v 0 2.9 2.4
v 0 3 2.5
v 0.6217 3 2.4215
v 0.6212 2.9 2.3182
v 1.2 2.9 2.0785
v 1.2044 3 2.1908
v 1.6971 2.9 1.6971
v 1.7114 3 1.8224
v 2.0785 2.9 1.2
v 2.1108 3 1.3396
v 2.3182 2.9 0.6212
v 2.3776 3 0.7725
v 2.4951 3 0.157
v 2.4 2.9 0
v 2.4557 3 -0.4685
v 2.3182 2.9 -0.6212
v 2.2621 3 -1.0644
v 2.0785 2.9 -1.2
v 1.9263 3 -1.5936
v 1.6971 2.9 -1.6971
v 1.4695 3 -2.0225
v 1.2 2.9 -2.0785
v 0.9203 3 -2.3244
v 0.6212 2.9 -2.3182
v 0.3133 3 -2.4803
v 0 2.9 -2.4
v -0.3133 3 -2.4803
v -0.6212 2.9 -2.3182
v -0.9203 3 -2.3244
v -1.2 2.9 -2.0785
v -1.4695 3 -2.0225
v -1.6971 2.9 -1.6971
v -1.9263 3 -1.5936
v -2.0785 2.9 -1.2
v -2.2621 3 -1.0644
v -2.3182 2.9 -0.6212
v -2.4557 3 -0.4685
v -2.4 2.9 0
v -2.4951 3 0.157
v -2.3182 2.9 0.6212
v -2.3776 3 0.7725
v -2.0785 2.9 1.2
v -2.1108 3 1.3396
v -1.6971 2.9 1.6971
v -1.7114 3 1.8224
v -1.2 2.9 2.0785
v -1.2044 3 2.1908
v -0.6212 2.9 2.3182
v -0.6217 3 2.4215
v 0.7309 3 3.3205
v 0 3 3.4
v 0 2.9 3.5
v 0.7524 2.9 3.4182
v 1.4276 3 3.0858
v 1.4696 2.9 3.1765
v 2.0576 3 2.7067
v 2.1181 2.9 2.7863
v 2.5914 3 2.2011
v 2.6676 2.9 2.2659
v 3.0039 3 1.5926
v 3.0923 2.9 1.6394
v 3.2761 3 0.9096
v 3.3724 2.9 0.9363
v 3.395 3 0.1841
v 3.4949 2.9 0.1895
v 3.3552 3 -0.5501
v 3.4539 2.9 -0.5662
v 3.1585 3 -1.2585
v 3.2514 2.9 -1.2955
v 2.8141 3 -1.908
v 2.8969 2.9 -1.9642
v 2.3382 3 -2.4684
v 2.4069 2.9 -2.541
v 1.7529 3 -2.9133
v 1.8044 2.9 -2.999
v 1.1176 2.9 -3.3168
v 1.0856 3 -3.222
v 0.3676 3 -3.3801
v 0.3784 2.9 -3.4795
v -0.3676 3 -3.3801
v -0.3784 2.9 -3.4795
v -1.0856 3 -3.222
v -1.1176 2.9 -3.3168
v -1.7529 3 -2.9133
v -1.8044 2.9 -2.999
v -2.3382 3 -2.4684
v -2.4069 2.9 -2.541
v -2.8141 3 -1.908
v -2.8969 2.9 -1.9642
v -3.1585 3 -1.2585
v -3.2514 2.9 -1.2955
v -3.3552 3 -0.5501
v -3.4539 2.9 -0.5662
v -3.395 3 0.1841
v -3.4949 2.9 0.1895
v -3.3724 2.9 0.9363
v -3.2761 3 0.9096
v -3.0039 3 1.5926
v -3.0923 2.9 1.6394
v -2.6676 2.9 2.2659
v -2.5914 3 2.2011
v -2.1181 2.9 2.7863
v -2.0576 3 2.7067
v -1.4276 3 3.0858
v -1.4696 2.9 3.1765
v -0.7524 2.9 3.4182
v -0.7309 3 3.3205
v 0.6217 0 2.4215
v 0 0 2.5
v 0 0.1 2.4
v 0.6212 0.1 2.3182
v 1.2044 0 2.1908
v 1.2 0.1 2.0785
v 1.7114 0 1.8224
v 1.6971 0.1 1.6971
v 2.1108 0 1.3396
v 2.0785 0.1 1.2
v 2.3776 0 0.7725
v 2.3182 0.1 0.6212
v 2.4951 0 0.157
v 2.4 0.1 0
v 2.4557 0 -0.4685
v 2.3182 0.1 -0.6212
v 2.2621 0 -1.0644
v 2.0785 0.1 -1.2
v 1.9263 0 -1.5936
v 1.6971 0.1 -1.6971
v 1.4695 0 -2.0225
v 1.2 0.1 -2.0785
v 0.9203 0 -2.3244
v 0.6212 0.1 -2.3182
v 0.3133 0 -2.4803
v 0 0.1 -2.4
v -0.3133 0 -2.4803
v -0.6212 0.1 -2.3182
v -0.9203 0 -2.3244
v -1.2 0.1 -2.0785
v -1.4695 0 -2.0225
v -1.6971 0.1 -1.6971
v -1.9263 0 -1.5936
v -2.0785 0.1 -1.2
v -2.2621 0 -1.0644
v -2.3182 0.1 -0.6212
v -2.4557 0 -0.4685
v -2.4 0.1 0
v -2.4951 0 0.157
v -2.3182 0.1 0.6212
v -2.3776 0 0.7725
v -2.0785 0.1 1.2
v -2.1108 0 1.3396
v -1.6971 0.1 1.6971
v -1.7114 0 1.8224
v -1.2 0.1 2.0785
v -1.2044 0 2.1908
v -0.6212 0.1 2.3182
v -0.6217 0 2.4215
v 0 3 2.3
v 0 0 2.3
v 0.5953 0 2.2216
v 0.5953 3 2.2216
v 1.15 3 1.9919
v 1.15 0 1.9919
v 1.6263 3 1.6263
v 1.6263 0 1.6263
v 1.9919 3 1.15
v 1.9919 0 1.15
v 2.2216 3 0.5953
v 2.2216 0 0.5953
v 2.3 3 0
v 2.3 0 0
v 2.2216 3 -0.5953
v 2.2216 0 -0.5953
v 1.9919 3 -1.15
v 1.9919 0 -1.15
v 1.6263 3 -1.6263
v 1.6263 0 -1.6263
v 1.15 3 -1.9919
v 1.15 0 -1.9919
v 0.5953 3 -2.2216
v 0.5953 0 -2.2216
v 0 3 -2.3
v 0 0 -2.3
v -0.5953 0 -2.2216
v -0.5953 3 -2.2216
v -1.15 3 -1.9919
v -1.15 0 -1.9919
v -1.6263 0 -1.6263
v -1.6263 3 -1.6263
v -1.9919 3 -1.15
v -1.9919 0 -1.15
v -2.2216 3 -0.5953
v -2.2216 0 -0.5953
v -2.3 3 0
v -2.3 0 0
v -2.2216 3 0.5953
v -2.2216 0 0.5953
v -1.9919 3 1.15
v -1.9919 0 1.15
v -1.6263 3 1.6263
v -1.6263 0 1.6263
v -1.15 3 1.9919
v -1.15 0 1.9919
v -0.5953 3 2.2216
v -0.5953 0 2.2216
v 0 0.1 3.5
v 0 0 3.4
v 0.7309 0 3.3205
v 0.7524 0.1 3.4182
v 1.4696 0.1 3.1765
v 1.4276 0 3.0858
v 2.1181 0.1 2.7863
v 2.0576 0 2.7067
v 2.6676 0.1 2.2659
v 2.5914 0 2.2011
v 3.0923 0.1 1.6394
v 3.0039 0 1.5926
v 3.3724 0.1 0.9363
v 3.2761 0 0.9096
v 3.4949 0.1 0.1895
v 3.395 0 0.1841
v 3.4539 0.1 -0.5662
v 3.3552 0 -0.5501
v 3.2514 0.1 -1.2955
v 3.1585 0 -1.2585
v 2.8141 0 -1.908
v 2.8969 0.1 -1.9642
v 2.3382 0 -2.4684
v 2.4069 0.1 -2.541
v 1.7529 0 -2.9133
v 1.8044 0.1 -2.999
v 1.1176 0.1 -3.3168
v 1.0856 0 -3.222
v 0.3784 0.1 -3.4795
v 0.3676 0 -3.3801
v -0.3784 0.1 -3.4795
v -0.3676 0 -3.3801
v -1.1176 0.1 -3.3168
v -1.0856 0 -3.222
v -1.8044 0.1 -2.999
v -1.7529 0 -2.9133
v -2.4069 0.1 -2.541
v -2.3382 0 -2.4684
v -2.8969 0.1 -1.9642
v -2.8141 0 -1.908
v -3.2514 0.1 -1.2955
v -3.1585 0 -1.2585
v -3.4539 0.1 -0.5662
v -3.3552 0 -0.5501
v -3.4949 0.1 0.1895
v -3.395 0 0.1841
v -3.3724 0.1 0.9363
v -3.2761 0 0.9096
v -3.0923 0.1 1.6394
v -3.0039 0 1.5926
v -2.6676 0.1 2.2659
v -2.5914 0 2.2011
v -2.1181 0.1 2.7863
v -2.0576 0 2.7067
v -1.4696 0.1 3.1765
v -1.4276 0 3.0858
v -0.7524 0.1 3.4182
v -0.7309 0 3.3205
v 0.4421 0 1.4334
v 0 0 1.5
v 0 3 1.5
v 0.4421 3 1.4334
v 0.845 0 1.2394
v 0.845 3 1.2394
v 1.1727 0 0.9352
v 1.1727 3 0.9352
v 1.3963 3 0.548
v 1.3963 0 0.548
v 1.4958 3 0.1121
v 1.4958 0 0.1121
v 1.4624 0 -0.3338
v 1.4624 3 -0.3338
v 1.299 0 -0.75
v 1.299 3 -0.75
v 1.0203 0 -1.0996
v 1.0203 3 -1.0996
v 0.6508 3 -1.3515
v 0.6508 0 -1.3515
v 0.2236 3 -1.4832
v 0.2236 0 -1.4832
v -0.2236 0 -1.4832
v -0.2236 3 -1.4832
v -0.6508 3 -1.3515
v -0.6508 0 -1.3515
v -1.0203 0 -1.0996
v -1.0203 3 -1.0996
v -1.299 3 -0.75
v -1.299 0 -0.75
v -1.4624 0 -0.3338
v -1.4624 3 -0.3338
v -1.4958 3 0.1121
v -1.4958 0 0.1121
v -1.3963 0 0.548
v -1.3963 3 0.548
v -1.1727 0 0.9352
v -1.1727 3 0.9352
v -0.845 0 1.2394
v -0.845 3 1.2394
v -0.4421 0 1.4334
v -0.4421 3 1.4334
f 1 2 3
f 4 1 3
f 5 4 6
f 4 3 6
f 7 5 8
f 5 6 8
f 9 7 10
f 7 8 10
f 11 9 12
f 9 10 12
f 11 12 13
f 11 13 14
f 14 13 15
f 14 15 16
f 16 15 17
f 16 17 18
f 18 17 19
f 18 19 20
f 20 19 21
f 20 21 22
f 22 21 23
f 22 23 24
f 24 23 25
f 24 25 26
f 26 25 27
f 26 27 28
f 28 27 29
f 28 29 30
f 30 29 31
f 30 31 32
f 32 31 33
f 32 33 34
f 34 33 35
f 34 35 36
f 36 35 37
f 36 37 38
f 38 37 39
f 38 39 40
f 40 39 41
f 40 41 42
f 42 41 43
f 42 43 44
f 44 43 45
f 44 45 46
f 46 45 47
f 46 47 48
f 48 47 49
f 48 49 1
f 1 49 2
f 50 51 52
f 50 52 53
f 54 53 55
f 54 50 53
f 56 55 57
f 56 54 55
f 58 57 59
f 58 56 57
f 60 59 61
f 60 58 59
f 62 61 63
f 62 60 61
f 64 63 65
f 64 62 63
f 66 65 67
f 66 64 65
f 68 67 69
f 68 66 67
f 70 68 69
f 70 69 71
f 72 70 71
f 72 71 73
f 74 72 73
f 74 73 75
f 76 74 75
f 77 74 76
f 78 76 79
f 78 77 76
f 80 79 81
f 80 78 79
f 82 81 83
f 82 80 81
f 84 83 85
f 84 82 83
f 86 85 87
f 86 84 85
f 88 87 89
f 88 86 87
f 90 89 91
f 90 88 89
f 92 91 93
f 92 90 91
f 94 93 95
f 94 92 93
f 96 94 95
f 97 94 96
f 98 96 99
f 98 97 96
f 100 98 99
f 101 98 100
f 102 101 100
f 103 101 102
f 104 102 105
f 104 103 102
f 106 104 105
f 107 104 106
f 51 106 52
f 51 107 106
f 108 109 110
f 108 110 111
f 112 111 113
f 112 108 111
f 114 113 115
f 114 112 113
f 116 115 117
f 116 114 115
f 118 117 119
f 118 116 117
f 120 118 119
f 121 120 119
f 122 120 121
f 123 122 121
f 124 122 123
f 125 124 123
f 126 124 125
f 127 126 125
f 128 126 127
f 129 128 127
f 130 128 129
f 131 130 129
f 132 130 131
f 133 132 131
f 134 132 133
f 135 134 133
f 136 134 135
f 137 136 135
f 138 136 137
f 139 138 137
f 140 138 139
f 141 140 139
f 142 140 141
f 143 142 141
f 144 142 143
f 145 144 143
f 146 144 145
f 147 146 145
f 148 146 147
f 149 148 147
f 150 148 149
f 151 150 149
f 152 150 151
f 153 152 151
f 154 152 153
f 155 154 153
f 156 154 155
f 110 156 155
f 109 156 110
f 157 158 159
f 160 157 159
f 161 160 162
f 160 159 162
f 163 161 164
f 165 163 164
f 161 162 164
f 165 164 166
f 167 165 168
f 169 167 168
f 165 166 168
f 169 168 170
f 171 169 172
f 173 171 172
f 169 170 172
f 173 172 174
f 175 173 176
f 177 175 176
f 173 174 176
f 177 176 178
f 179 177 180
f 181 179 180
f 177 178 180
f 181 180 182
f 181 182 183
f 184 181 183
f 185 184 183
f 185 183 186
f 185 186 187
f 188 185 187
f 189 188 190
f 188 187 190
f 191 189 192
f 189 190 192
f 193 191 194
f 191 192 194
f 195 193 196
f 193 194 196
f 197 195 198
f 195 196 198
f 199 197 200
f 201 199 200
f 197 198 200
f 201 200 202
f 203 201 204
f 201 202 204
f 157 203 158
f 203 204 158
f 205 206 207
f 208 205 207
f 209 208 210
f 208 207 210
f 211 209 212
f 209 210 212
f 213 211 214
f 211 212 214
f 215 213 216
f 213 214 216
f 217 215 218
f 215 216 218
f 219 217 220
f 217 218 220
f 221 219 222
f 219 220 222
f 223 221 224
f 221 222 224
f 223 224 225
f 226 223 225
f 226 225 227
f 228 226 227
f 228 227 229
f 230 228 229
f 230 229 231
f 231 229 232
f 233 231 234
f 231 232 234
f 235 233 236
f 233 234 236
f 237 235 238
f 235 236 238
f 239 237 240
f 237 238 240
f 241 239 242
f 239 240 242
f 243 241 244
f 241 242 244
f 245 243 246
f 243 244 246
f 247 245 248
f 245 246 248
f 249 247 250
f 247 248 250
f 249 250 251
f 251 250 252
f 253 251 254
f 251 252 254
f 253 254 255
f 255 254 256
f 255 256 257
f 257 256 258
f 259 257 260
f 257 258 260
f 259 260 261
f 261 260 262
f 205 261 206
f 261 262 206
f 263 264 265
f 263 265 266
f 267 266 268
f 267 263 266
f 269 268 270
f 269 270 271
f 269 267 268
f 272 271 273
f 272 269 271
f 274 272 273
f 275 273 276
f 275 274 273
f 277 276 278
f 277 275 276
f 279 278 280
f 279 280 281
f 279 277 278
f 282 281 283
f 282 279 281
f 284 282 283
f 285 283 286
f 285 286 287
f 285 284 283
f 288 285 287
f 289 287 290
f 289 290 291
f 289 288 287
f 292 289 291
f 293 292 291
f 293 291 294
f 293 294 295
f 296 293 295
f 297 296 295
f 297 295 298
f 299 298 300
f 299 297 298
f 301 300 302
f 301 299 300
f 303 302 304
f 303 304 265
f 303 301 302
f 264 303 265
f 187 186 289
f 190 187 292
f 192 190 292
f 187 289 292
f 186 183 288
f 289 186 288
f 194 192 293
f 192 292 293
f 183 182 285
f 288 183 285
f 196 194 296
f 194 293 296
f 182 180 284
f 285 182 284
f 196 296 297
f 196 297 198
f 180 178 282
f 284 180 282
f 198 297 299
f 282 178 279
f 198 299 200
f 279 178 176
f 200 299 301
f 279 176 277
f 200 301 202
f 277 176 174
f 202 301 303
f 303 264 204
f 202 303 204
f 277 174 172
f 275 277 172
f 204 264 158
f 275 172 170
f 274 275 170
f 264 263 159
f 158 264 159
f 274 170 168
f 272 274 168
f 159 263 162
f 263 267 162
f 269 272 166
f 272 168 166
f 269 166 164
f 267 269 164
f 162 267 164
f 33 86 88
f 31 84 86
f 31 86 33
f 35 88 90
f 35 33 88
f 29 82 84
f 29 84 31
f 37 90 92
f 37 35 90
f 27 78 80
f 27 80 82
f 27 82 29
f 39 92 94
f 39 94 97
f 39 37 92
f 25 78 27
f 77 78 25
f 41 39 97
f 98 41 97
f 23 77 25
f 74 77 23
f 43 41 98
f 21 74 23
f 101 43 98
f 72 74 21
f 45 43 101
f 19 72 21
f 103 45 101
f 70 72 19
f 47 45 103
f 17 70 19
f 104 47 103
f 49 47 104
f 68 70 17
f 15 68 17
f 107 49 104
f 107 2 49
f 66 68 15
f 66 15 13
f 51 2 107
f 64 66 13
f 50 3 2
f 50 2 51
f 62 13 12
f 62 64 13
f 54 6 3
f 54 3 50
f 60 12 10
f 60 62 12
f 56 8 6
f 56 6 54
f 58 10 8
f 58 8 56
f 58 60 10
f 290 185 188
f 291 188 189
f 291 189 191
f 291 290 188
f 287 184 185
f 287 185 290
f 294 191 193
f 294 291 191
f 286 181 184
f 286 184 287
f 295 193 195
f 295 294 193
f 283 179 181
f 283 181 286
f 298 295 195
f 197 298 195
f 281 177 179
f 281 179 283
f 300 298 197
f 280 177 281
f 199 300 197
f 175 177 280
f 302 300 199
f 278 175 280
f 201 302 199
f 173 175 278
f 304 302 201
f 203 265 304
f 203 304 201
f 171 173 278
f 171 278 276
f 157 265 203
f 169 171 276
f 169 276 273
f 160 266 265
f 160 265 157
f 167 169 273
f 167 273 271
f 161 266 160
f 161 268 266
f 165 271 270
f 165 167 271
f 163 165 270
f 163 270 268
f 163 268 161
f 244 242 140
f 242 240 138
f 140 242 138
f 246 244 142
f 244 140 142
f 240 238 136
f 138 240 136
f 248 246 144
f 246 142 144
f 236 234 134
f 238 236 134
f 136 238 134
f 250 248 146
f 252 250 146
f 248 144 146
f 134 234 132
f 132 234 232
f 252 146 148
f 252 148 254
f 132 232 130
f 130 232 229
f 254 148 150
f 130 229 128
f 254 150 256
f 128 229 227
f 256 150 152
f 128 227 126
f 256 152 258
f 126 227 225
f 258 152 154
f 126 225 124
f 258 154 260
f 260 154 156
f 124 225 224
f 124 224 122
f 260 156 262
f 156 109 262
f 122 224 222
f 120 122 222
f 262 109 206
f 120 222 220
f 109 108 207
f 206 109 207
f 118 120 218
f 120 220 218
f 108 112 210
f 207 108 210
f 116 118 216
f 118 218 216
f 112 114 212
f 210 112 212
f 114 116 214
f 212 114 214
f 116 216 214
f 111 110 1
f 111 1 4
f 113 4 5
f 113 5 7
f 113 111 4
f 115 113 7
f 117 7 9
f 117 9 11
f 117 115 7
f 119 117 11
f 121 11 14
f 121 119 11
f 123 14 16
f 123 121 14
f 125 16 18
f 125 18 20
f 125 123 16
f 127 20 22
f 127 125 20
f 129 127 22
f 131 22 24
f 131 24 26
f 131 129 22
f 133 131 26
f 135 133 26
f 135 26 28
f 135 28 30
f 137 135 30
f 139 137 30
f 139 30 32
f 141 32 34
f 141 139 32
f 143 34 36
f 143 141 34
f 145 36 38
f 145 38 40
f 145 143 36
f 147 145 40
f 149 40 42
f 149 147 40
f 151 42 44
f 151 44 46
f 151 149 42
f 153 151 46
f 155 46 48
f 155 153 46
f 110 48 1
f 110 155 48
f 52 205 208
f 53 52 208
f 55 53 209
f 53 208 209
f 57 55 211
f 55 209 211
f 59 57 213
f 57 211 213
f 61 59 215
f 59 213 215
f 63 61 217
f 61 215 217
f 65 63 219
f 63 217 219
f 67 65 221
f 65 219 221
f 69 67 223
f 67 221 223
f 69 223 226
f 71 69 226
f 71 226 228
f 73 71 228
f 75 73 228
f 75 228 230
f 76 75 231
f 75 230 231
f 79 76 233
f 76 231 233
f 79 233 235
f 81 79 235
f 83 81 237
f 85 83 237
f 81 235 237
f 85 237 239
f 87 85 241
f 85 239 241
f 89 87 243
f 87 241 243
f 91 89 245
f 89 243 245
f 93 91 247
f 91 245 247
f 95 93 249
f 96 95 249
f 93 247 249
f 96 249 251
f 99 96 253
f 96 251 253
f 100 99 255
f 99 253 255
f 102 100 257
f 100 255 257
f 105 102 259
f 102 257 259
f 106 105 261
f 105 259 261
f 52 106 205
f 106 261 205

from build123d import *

# Parameters (mm, degrees)
ESQUISSE1_R          = 3.5
ESQUISSE1_R_2        = 2.4
BOSS_EXTRU_1_DEPTH   = 3
ESQUISSE1_R_3        = 2.3
ESQUISSE1_R_4        = 1.5
BOSS_EXTRU_1_2_DEPTH = 3
CHANFREIN1_SIZE      = 0.1


with BuildPart() as part:
    # Esquisse1 → Boss.-Extru.1 (new body)
    with BuildSketch(Plane(origin=(0, 0, 0), x_dir=(1, 0, 0), z_dir=(0, 1, 0))):
        with Locations(Location((0, 0, 0), (0, 0, 270))):
            Circle(ESQUISSE1_R)
        with Locations(Location((0, 0, 0), (0, 0, 270))):
            Circle(ESQUISSE1_R_2, mode=Mode.SUBTRACT)
    extrude(amount=BOSS_EXTRU_1_DEPTH)

    # Chanfrein1
    chanfrein1_edges = [part.edges().sort_by_distance(p)[0] for p in [
        (0, 0, -3.5),
        (0, 0, -2.4),
        (0, 3, -2.4),
        (0, 3, -3.5),
    ]]
    chamfer(chanfrein1_edges, length=CHANFREIN1_SIZE)


with BuildPart() as body_2:
    # Esquisse1 → Boss.-Extru.1 2 (new body)
    with BuildSketch(Plane(origin=(0, 0, 0), x_dir=(1, 0, 0), z_dir=(0, 1, 0))):
        with Locations(Location((0, 0, 0), (0, 0, 270))):
            Circle(ESQUISSE1_R_3)
        with Locations(Location((0, 0, 0), (0, 0, 270))):
            Circle(ESQUISSE1_R_4, mode=Mode.SUBTRACT)
    extrude(amount=BOSS_EXTRU_1_2_DEPTH)


solid = Compound([part.part, body_2.part])
